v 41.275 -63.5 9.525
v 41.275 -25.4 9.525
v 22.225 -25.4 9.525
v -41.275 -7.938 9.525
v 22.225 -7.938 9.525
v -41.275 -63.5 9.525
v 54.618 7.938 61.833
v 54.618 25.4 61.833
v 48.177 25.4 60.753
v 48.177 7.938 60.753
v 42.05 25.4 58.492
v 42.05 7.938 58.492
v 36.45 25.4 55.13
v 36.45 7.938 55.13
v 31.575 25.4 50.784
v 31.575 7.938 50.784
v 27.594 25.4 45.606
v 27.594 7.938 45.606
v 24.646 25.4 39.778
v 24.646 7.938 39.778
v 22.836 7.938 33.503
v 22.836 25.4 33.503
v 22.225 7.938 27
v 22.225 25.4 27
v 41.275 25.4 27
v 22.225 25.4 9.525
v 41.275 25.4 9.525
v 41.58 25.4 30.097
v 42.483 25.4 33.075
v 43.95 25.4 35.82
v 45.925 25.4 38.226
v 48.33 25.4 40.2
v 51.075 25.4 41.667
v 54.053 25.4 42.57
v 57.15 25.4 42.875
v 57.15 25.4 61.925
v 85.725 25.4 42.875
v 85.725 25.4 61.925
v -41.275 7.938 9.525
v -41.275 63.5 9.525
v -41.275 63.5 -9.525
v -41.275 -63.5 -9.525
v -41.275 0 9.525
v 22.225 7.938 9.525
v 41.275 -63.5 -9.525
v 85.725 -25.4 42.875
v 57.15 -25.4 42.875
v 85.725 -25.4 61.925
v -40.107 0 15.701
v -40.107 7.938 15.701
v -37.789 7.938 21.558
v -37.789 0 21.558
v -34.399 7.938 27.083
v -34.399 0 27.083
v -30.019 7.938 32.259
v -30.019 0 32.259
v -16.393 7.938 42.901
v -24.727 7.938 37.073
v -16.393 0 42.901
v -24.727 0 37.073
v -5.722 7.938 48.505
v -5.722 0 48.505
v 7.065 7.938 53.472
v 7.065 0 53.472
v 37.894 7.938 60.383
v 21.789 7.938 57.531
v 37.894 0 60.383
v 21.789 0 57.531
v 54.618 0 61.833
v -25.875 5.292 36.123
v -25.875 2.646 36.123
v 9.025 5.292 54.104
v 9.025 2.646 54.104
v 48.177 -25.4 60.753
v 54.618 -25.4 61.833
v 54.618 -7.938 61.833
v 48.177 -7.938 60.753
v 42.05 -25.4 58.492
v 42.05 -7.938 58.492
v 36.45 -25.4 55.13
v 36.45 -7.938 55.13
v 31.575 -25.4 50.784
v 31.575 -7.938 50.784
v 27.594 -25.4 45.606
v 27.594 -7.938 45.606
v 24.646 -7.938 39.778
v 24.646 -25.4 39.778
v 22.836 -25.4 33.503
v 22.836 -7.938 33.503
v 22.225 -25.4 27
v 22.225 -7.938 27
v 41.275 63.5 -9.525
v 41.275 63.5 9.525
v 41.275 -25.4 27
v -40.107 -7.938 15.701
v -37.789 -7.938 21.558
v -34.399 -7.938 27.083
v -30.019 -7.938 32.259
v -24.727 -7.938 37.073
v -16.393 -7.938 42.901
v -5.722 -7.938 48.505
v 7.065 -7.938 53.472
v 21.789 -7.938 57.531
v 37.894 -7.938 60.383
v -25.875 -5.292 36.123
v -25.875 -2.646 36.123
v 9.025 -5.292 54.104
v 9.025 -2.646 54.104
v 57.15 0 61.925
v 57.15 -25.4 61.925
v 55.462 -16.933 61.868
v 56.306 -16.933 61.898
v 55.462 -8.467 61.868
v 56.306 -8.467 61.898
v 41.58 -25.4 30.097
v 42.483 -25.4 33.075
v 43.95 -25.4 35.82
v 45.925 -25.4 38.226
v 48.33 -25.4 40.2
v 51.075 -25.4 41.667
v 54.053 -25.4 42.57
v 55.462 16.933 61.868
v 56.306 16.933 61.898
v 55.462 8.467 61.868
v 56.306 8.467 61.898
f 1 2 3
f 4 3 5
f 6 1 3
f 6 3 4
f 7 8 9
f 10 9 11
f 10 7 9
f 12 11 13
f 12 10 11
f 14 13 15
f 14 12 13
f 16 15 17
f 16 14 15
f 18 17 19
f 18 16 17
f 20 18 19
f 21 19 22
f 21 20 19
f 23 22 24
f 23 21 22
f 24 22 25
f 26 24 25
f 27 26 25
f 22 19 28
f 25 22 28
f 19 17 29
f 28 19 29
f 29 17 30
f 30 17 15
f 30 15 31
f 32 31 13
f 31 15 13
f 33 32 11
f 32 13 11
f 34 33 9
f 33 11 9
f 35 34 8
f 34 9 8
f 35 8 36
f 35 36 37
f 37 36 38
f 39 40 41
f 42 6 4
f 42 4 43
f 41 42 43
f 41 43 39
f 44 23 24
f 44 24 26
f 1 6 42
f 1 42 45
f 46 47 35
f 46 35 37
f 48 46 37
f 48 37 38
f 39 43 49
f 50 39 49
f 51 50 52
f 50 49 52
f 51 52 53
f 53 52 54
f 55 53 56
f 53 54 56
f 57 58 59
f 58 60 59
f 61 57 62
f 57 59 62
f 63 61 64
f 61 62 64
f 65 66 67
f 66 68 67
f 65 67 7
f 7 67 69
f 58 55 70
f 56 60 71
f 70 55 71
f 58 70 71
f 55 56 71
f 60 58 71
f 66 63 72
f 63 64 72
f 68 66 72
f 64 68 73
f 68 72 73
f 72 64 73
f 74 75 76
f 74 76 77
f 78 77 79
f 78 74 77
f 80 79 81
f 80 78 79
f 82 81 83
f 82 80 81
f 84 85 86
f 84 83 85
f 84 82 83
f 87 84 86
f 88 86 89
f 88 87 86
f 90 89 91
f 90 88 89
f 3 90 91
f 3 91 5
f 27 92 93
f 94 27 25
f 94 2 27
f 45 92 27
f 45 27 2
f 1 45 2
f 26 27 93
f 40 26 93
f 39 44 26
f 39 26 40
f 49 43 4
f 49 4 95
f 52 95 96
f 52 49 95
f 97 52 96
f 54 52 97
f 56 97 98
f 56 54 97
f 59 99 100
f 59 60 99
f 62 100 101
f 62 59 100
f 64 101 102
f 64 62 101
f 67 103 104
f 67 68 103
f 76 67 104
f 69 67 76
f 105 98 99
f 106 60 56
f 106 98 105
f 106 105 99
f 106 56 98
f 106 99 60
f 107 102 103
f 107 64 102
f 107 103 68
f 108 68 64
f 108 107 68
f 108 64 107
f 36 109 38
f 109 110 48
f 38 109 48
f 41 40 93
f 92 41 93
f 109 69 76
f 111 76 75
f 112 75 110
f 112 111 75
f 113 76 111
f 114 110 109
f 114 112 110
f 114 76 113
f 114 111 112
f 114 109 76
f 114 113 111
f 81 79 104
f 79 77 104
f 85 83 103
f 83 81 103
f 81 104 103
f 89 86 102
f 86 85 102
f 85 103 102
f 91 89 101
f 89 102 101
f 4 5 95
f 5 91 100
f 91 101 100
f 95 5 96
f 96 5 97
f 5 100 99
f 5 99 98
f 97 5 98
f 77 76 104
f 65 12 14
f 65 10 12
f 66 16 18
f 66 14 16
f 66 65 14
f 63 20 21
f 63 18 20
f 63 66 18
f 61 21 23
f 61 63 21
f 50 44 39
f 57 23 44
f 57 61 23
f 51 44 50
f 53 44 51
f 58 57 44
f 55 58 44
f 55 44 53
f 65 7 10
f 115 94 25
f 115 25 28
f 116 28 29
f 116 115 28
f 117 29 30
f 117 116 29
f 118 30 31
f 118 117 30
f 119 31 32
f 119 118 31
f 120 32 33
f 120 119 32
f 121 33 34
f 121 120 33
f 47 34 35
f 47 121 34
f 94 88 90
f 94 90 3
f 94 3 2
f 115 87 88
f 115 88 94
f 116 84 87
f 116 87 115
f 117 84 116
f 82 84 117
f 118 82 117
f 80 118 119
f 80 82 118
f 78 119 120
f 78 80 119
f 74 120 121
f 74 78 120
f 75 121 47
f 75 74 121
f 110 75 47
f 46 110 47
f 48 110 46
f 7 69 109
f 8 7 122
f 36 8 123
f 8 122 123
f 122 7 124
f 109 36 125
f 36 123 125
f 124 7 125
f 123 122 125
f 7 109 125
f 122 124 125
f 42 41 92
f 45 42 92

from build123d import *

# Parameters (mm, degrees)
F1_DEPTH = 63.5
F2_DEPTH = 25.4
F0_W     = 25.4
F0_H     = 19.05
F3_DEPTH = 25.4
F4_DEPTH = 7.9375


with BuildPart() as f1:
    # F0 (on Front) → F1 (new body, symmetric)
    with BuildSketch(Plane.XZ):
        Polygon((-41.275, 9.525), (-41.275, -9.525), (41.275, -9.525), (41.275, 9.525), (22.225, 9.525), align=None)
    extrude(amount=F1_DEPTH, both=True)

    # F0 (on Front) → F2 (join, symmetric)
    with BuildSketch(Plane.XZ):
        with BuildLine():
            Line((22.225, 9.525), (41.275, 9.525))
            Line((41.275, 9.525), (41.275, 27.0002))
            ThreePointArc((41.275, 27.0002), (45.92468, 38.22552), (57.15, 42.8752))
            Line((57.15, 42.8752), (60.325, 42.8752))
            Line((60.325, 42.8752), (60.325, 61.9252))
            Line((60.325, 61.9252), (57.15, 61.9252))
            add(Edge.make_bspline(
                [(54.618109, 61.833304), (55.461271, 61.86945), (56.305306, 61.900096), (57.15, 61.9252)],
                knots=[109.579831, 109.579831, 109.579831, 109.579831, 111.504536, 111.504536, 111.504536, 111.504536], degree=3))
            ThreePointArc((54.618109, 61.833304), (31.574798, 50.783906), (22.225, 27.0002))
            Line((22.225, 27.0002), (22.225, 9.525))
        make_face()
    extrude(amount=F2_DEPTH, both=True)

    # F0 (on Front) → F3 (join, symmetric)
    with BuildSketch(Plane.XZ):
        with Locations((73.025, 52.4002)):
            Rectangle(F0_W, F0_H)
    extrude(amount=F3_DEPTH, both=True)

    # F0 (on Front) → F4 (join, symmetric)
    with BuildSketch(Plane.XZ):
        with BuildLine():
            add(Edge.make_bspline(
                [(-41.275, 9.525), (-38.560078, 39.886518), (6.614079, 59.775381), (54.618109, 61.833304)],
                knots=[0, 0, 0, 0, 109.579831, 109.579831, 109.579831, 109.579831], degree=3))
            Line((-41.275, 9.525), (22.225, 9.525))
            Line((22.225, 9.525), (22.225, 27.0002))
            ThreePointArc((22.225, 27.0002), (31.574798, 50.783906), (54.618109, 61.833304))
        make_face()
    extrude(amount=F4_DEPTH, both=True)


solid = f1.part
